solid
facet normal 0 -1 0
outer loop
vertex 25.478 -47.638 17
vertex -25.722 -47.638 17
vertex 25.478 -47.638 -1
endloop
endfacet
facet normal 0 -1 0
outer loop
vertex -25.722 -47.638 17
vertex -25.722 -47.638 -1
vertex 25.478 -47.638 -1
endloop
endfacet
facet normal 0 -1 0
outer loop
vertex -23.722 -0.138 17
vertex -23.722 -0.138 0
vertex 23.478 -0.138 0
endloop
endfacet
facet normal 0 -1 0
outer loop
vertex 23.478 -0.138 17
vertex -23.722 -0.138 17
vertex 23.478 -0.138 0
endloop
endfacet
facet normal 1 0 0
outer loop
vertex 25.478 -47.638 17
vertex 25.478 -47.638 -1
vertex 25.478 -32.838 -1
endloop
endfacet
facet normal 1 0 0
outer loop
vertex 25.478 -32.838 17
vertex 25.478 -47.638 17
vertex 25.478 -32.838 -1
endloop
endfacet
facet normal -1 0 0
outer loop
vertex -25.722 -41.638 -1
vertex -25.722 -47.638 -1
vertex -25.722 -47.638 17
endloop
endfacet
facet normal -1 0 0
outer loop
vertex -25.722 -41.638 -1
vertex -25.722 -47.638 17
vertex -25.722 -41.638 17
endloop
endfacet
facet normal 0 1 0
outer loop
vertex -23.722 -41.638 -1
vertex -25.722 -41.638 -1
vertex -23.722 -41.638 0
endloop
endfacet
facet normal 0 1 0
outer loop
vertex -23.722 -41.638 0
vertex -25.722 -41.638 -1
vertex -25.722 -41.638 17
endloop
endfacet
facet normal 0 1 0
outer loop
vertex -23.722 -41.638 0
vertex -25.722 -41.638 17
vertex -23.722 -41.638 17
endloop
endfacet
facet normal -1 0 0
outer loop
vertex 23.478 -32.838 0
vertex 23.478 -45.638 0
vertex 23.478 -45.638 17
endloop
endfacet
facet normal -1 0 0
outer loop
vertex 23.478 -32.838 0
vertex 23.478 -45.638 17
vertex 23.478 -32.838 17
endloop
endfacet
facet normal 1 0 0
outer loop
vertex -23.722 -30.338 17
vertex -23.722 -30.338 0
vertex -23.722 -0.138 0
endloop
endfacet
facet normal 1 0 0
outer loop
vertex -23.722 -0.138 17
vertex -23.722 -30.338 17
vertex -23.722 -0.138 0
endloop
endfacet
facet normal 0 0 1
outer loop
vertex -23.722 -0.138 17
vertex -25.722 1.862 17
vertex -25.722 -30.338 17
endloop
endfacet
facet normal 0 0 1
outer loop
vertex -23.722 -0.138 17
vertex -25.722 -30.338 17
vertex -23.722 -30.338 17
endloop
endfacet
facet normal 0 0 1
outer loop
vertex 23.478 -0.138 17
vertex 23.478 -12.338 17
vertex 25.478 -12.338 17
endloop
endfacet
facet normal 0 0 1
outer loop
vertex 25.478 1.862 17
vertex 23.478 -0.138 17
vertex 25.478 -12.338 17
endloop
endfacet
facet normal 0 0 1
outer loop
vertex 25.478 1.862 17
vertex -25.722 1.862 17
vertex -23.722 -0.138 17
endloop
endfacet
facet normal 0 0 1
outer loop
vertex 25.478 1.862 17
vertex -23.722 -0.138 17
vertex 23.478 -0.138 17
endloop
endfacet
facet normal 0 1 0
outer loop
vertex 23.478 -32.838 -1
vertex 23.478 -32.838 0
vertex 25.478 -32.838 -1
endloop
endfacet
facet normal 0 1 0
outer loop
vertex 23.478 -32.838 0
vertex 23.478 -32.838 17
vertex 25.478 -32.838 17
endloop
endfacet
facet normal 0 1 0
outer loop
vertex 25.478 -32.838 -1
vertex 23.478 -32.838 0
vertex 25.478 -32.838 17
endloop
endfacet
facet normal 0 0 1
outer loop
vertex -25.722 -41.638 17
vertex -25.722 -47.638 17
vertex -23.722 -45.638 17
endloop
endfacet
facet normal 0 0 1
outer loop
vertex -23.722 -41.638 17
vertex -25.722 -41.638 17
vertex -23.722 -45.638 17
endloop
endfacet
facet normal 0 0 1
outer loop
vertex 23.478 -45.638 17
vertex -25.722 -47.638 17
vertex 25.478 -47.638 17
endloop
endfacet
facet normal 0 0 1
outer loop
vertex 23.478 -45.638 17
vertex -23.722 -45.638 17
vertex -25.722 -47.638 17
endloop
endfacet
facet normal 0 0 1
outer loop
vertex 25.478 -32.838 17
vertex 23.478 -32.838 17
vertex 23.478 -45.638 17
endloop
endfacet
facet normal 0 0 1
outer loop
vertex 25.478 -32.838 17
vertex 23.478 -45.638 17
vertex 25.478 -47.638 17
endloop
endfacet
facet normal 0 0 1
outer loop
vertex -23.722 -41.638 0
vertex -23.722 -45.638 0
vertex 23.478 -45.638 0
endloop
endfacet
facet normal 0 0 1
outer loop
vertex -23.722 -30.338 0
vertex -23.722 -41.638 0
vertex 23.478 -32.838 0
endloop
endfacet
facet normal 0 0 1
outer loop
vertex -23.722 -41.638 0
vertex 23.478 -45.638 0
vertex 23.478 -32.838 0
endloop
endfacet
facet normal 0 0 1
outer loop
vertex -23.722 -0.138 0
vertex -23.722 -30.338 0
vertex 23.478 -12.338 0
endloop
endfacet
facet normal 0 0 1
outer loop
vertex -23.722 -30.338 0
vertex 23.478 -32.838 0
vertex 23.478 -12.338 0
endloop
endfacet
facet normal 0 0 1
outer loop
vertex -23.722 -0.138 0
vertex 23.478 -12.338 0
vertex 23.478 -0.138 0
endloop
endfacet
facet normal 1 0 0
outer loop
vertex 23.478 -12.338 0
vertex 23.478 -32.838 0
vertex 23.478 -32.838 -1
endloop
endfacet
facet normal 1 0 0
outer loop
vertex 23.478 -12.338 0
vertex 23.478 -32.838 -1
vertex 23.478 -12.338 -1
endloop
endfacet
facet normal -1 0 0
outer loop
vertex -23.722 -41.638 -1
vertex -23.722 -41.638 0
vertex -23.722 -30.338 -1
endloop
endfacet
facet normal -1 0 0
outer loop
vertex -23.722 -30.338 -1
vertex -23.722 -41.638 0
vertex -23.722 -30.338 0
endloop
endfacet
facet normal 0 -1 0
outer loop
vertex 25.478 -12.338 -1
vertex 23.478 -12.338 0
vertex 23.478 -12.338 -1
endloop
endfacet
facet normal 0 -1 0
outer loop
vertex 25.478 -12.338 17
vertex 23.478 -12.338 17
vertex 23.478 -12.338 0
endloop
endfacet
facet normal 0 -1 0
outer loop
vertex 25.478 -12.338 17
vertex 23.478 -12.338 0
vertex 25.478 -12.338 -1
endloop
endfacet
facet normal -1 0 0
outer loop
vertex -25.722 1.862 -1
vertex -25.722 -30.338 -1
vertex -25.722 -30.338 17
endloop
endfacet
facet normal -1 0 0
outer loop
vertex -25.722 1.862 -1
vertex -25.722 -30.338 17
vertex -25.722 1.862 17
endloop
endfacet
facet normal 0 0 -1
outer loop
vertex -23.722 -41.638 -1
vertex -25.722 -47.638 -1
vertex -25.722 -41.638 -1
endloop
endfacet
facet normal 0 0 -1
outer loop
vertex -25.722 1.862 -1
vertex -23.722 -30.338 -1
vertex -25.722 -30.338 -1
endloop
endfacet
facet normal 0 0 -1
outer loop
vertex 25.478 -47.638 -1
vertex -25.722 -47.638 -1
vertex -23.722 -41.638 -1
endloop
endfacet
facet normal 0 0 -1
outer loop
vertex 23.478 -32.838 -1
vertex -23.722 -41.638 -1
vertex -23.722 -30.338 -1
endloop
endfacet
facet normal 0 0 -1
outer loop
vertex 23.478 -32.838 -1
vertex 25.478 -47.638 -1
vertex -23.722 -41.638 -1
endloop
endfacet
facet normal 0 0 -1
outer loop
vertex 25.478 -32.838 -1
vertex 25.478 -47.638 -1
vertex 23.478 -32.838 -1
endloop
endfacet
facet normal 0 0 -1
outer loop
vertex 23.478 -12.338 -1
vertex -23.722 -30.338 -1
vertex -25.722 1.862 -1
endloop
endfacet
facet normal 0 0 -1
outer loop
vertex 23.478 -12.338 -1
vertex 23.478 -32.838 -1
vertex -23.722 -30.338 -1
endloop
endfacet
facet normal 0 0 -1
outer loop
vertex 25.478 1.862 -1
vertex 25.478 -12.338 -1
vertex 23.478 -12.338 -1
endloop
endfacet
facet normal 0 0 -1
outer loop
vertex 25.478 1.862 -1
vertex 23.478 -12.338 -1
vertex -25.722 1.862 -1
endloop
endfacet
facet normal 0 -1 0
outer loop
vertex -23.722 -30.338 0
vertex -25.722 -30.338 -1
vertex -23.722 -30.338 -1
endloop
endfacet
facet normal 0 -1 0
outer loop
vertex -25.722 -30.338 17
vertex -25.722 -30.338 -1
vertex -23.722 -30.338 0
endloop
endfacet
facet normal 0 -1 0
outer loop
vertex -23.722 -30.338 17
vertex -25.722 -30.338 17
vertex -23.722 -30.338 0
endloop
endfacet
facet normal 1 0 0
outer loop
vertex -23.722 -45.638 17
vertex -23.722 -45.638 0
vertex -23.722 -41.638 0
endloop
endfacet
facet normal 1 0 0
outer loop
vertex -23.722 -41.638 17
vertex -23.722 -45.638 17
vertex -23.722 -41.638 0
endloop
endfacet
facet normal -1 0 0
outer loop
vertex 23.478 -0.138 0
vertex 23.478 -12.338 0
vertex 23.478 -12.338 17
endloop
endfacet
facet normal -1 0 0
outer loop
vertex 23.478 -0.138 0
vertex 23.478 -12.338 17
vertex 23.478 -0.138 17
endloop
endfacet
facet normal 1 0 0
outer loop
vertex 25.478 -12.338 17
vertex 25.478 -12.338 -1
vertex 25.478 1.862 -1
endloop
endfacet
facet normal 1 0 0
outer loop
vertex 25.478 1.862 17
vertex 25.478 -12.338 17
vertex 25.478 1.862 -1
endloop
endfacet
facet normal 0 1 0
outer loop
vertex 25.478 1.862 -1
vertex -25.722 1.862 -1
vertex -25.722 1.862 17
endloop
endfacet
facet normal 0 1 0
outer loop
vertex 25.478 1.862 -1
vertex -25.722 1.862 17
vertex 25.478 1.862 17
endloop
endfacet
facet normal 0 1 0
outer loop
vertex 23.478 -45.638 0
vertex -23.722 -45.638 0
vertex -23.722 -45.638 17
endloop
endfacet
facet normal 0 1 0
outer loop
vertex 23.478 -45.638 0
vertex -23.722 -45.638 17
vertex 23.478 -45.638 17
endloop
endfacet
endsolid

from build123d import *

# Parameters (mm, degrees)
ESQUISSE1_W             = 51.2
ESQUISSE1_H             = 49.5
ESQUISSE1_W_2           = 47.2
ESQUISSE1_H_2           = 45.5
BOSS_EXTRU_1_DEPTH      = 17
ESQUISSE2_W             = 1
ESQUISSE2_H             = 49.5
BOSS_EXTRU_2_DEPTH      = 51.2
ESQUISSE3_W             = 2
ESQUISSE3_H             = 20.5
ESQUISSE3_H_2           = 11.3
ENL_V_MAT_EXTRU_2_DEPTH = 19


with BuildPart() as part:
    # Esquisse1 → Boss.-Extru.1 (new body)
    with BuildSketch(Plane.XY):
        with Locations((-0.122014971, -22.887662338)):
            Rectangle(ESQUISSE1_W, ESQUISSE1_H)
        with Locations((-0.122014971, -22.887662338)):
            Rectangle(ESQUISSE1_W_2, ESQUISSE1_H_2, mode=Mode.SUBTRACT)
    extrude(amount=BOSS_EXTRU_1_DEPTH)

    # Esquisse2 → Boss.-Extru.2 (add)
    with BuildSketch(Plane(origin=(25.477985029, 0, 0), x_dir=(0, 0, -1), z_dir=(1, 0, 0))):
        with Locations((0.5, -22.887662338)):
            Rectangle(ESQUISSE2_W, ESQUISSE2_H)
    extrude(amount=-BOSS_EXTRU_2_DEPTH)

    # Esquisse3 → Enlèv. mat.-Extru.2 (cut)
    with BuildSketch(Plane.XY.offset(17)):
        with Locations((24.477985029, -22.587662338)):
            Rectangle(ESQUISSE3_W, ESQUISSE3_H)
        with Locations((-24.722014971, -35.987662338)):
            Rectangle(ESQUISSE3_W, ESQUISSE3_H_2)
    extrude(amount=-ENL_V_MAT_EXTRU_2_DEPTH, mode=Mode.SUBTRACT)


solid = part.part
